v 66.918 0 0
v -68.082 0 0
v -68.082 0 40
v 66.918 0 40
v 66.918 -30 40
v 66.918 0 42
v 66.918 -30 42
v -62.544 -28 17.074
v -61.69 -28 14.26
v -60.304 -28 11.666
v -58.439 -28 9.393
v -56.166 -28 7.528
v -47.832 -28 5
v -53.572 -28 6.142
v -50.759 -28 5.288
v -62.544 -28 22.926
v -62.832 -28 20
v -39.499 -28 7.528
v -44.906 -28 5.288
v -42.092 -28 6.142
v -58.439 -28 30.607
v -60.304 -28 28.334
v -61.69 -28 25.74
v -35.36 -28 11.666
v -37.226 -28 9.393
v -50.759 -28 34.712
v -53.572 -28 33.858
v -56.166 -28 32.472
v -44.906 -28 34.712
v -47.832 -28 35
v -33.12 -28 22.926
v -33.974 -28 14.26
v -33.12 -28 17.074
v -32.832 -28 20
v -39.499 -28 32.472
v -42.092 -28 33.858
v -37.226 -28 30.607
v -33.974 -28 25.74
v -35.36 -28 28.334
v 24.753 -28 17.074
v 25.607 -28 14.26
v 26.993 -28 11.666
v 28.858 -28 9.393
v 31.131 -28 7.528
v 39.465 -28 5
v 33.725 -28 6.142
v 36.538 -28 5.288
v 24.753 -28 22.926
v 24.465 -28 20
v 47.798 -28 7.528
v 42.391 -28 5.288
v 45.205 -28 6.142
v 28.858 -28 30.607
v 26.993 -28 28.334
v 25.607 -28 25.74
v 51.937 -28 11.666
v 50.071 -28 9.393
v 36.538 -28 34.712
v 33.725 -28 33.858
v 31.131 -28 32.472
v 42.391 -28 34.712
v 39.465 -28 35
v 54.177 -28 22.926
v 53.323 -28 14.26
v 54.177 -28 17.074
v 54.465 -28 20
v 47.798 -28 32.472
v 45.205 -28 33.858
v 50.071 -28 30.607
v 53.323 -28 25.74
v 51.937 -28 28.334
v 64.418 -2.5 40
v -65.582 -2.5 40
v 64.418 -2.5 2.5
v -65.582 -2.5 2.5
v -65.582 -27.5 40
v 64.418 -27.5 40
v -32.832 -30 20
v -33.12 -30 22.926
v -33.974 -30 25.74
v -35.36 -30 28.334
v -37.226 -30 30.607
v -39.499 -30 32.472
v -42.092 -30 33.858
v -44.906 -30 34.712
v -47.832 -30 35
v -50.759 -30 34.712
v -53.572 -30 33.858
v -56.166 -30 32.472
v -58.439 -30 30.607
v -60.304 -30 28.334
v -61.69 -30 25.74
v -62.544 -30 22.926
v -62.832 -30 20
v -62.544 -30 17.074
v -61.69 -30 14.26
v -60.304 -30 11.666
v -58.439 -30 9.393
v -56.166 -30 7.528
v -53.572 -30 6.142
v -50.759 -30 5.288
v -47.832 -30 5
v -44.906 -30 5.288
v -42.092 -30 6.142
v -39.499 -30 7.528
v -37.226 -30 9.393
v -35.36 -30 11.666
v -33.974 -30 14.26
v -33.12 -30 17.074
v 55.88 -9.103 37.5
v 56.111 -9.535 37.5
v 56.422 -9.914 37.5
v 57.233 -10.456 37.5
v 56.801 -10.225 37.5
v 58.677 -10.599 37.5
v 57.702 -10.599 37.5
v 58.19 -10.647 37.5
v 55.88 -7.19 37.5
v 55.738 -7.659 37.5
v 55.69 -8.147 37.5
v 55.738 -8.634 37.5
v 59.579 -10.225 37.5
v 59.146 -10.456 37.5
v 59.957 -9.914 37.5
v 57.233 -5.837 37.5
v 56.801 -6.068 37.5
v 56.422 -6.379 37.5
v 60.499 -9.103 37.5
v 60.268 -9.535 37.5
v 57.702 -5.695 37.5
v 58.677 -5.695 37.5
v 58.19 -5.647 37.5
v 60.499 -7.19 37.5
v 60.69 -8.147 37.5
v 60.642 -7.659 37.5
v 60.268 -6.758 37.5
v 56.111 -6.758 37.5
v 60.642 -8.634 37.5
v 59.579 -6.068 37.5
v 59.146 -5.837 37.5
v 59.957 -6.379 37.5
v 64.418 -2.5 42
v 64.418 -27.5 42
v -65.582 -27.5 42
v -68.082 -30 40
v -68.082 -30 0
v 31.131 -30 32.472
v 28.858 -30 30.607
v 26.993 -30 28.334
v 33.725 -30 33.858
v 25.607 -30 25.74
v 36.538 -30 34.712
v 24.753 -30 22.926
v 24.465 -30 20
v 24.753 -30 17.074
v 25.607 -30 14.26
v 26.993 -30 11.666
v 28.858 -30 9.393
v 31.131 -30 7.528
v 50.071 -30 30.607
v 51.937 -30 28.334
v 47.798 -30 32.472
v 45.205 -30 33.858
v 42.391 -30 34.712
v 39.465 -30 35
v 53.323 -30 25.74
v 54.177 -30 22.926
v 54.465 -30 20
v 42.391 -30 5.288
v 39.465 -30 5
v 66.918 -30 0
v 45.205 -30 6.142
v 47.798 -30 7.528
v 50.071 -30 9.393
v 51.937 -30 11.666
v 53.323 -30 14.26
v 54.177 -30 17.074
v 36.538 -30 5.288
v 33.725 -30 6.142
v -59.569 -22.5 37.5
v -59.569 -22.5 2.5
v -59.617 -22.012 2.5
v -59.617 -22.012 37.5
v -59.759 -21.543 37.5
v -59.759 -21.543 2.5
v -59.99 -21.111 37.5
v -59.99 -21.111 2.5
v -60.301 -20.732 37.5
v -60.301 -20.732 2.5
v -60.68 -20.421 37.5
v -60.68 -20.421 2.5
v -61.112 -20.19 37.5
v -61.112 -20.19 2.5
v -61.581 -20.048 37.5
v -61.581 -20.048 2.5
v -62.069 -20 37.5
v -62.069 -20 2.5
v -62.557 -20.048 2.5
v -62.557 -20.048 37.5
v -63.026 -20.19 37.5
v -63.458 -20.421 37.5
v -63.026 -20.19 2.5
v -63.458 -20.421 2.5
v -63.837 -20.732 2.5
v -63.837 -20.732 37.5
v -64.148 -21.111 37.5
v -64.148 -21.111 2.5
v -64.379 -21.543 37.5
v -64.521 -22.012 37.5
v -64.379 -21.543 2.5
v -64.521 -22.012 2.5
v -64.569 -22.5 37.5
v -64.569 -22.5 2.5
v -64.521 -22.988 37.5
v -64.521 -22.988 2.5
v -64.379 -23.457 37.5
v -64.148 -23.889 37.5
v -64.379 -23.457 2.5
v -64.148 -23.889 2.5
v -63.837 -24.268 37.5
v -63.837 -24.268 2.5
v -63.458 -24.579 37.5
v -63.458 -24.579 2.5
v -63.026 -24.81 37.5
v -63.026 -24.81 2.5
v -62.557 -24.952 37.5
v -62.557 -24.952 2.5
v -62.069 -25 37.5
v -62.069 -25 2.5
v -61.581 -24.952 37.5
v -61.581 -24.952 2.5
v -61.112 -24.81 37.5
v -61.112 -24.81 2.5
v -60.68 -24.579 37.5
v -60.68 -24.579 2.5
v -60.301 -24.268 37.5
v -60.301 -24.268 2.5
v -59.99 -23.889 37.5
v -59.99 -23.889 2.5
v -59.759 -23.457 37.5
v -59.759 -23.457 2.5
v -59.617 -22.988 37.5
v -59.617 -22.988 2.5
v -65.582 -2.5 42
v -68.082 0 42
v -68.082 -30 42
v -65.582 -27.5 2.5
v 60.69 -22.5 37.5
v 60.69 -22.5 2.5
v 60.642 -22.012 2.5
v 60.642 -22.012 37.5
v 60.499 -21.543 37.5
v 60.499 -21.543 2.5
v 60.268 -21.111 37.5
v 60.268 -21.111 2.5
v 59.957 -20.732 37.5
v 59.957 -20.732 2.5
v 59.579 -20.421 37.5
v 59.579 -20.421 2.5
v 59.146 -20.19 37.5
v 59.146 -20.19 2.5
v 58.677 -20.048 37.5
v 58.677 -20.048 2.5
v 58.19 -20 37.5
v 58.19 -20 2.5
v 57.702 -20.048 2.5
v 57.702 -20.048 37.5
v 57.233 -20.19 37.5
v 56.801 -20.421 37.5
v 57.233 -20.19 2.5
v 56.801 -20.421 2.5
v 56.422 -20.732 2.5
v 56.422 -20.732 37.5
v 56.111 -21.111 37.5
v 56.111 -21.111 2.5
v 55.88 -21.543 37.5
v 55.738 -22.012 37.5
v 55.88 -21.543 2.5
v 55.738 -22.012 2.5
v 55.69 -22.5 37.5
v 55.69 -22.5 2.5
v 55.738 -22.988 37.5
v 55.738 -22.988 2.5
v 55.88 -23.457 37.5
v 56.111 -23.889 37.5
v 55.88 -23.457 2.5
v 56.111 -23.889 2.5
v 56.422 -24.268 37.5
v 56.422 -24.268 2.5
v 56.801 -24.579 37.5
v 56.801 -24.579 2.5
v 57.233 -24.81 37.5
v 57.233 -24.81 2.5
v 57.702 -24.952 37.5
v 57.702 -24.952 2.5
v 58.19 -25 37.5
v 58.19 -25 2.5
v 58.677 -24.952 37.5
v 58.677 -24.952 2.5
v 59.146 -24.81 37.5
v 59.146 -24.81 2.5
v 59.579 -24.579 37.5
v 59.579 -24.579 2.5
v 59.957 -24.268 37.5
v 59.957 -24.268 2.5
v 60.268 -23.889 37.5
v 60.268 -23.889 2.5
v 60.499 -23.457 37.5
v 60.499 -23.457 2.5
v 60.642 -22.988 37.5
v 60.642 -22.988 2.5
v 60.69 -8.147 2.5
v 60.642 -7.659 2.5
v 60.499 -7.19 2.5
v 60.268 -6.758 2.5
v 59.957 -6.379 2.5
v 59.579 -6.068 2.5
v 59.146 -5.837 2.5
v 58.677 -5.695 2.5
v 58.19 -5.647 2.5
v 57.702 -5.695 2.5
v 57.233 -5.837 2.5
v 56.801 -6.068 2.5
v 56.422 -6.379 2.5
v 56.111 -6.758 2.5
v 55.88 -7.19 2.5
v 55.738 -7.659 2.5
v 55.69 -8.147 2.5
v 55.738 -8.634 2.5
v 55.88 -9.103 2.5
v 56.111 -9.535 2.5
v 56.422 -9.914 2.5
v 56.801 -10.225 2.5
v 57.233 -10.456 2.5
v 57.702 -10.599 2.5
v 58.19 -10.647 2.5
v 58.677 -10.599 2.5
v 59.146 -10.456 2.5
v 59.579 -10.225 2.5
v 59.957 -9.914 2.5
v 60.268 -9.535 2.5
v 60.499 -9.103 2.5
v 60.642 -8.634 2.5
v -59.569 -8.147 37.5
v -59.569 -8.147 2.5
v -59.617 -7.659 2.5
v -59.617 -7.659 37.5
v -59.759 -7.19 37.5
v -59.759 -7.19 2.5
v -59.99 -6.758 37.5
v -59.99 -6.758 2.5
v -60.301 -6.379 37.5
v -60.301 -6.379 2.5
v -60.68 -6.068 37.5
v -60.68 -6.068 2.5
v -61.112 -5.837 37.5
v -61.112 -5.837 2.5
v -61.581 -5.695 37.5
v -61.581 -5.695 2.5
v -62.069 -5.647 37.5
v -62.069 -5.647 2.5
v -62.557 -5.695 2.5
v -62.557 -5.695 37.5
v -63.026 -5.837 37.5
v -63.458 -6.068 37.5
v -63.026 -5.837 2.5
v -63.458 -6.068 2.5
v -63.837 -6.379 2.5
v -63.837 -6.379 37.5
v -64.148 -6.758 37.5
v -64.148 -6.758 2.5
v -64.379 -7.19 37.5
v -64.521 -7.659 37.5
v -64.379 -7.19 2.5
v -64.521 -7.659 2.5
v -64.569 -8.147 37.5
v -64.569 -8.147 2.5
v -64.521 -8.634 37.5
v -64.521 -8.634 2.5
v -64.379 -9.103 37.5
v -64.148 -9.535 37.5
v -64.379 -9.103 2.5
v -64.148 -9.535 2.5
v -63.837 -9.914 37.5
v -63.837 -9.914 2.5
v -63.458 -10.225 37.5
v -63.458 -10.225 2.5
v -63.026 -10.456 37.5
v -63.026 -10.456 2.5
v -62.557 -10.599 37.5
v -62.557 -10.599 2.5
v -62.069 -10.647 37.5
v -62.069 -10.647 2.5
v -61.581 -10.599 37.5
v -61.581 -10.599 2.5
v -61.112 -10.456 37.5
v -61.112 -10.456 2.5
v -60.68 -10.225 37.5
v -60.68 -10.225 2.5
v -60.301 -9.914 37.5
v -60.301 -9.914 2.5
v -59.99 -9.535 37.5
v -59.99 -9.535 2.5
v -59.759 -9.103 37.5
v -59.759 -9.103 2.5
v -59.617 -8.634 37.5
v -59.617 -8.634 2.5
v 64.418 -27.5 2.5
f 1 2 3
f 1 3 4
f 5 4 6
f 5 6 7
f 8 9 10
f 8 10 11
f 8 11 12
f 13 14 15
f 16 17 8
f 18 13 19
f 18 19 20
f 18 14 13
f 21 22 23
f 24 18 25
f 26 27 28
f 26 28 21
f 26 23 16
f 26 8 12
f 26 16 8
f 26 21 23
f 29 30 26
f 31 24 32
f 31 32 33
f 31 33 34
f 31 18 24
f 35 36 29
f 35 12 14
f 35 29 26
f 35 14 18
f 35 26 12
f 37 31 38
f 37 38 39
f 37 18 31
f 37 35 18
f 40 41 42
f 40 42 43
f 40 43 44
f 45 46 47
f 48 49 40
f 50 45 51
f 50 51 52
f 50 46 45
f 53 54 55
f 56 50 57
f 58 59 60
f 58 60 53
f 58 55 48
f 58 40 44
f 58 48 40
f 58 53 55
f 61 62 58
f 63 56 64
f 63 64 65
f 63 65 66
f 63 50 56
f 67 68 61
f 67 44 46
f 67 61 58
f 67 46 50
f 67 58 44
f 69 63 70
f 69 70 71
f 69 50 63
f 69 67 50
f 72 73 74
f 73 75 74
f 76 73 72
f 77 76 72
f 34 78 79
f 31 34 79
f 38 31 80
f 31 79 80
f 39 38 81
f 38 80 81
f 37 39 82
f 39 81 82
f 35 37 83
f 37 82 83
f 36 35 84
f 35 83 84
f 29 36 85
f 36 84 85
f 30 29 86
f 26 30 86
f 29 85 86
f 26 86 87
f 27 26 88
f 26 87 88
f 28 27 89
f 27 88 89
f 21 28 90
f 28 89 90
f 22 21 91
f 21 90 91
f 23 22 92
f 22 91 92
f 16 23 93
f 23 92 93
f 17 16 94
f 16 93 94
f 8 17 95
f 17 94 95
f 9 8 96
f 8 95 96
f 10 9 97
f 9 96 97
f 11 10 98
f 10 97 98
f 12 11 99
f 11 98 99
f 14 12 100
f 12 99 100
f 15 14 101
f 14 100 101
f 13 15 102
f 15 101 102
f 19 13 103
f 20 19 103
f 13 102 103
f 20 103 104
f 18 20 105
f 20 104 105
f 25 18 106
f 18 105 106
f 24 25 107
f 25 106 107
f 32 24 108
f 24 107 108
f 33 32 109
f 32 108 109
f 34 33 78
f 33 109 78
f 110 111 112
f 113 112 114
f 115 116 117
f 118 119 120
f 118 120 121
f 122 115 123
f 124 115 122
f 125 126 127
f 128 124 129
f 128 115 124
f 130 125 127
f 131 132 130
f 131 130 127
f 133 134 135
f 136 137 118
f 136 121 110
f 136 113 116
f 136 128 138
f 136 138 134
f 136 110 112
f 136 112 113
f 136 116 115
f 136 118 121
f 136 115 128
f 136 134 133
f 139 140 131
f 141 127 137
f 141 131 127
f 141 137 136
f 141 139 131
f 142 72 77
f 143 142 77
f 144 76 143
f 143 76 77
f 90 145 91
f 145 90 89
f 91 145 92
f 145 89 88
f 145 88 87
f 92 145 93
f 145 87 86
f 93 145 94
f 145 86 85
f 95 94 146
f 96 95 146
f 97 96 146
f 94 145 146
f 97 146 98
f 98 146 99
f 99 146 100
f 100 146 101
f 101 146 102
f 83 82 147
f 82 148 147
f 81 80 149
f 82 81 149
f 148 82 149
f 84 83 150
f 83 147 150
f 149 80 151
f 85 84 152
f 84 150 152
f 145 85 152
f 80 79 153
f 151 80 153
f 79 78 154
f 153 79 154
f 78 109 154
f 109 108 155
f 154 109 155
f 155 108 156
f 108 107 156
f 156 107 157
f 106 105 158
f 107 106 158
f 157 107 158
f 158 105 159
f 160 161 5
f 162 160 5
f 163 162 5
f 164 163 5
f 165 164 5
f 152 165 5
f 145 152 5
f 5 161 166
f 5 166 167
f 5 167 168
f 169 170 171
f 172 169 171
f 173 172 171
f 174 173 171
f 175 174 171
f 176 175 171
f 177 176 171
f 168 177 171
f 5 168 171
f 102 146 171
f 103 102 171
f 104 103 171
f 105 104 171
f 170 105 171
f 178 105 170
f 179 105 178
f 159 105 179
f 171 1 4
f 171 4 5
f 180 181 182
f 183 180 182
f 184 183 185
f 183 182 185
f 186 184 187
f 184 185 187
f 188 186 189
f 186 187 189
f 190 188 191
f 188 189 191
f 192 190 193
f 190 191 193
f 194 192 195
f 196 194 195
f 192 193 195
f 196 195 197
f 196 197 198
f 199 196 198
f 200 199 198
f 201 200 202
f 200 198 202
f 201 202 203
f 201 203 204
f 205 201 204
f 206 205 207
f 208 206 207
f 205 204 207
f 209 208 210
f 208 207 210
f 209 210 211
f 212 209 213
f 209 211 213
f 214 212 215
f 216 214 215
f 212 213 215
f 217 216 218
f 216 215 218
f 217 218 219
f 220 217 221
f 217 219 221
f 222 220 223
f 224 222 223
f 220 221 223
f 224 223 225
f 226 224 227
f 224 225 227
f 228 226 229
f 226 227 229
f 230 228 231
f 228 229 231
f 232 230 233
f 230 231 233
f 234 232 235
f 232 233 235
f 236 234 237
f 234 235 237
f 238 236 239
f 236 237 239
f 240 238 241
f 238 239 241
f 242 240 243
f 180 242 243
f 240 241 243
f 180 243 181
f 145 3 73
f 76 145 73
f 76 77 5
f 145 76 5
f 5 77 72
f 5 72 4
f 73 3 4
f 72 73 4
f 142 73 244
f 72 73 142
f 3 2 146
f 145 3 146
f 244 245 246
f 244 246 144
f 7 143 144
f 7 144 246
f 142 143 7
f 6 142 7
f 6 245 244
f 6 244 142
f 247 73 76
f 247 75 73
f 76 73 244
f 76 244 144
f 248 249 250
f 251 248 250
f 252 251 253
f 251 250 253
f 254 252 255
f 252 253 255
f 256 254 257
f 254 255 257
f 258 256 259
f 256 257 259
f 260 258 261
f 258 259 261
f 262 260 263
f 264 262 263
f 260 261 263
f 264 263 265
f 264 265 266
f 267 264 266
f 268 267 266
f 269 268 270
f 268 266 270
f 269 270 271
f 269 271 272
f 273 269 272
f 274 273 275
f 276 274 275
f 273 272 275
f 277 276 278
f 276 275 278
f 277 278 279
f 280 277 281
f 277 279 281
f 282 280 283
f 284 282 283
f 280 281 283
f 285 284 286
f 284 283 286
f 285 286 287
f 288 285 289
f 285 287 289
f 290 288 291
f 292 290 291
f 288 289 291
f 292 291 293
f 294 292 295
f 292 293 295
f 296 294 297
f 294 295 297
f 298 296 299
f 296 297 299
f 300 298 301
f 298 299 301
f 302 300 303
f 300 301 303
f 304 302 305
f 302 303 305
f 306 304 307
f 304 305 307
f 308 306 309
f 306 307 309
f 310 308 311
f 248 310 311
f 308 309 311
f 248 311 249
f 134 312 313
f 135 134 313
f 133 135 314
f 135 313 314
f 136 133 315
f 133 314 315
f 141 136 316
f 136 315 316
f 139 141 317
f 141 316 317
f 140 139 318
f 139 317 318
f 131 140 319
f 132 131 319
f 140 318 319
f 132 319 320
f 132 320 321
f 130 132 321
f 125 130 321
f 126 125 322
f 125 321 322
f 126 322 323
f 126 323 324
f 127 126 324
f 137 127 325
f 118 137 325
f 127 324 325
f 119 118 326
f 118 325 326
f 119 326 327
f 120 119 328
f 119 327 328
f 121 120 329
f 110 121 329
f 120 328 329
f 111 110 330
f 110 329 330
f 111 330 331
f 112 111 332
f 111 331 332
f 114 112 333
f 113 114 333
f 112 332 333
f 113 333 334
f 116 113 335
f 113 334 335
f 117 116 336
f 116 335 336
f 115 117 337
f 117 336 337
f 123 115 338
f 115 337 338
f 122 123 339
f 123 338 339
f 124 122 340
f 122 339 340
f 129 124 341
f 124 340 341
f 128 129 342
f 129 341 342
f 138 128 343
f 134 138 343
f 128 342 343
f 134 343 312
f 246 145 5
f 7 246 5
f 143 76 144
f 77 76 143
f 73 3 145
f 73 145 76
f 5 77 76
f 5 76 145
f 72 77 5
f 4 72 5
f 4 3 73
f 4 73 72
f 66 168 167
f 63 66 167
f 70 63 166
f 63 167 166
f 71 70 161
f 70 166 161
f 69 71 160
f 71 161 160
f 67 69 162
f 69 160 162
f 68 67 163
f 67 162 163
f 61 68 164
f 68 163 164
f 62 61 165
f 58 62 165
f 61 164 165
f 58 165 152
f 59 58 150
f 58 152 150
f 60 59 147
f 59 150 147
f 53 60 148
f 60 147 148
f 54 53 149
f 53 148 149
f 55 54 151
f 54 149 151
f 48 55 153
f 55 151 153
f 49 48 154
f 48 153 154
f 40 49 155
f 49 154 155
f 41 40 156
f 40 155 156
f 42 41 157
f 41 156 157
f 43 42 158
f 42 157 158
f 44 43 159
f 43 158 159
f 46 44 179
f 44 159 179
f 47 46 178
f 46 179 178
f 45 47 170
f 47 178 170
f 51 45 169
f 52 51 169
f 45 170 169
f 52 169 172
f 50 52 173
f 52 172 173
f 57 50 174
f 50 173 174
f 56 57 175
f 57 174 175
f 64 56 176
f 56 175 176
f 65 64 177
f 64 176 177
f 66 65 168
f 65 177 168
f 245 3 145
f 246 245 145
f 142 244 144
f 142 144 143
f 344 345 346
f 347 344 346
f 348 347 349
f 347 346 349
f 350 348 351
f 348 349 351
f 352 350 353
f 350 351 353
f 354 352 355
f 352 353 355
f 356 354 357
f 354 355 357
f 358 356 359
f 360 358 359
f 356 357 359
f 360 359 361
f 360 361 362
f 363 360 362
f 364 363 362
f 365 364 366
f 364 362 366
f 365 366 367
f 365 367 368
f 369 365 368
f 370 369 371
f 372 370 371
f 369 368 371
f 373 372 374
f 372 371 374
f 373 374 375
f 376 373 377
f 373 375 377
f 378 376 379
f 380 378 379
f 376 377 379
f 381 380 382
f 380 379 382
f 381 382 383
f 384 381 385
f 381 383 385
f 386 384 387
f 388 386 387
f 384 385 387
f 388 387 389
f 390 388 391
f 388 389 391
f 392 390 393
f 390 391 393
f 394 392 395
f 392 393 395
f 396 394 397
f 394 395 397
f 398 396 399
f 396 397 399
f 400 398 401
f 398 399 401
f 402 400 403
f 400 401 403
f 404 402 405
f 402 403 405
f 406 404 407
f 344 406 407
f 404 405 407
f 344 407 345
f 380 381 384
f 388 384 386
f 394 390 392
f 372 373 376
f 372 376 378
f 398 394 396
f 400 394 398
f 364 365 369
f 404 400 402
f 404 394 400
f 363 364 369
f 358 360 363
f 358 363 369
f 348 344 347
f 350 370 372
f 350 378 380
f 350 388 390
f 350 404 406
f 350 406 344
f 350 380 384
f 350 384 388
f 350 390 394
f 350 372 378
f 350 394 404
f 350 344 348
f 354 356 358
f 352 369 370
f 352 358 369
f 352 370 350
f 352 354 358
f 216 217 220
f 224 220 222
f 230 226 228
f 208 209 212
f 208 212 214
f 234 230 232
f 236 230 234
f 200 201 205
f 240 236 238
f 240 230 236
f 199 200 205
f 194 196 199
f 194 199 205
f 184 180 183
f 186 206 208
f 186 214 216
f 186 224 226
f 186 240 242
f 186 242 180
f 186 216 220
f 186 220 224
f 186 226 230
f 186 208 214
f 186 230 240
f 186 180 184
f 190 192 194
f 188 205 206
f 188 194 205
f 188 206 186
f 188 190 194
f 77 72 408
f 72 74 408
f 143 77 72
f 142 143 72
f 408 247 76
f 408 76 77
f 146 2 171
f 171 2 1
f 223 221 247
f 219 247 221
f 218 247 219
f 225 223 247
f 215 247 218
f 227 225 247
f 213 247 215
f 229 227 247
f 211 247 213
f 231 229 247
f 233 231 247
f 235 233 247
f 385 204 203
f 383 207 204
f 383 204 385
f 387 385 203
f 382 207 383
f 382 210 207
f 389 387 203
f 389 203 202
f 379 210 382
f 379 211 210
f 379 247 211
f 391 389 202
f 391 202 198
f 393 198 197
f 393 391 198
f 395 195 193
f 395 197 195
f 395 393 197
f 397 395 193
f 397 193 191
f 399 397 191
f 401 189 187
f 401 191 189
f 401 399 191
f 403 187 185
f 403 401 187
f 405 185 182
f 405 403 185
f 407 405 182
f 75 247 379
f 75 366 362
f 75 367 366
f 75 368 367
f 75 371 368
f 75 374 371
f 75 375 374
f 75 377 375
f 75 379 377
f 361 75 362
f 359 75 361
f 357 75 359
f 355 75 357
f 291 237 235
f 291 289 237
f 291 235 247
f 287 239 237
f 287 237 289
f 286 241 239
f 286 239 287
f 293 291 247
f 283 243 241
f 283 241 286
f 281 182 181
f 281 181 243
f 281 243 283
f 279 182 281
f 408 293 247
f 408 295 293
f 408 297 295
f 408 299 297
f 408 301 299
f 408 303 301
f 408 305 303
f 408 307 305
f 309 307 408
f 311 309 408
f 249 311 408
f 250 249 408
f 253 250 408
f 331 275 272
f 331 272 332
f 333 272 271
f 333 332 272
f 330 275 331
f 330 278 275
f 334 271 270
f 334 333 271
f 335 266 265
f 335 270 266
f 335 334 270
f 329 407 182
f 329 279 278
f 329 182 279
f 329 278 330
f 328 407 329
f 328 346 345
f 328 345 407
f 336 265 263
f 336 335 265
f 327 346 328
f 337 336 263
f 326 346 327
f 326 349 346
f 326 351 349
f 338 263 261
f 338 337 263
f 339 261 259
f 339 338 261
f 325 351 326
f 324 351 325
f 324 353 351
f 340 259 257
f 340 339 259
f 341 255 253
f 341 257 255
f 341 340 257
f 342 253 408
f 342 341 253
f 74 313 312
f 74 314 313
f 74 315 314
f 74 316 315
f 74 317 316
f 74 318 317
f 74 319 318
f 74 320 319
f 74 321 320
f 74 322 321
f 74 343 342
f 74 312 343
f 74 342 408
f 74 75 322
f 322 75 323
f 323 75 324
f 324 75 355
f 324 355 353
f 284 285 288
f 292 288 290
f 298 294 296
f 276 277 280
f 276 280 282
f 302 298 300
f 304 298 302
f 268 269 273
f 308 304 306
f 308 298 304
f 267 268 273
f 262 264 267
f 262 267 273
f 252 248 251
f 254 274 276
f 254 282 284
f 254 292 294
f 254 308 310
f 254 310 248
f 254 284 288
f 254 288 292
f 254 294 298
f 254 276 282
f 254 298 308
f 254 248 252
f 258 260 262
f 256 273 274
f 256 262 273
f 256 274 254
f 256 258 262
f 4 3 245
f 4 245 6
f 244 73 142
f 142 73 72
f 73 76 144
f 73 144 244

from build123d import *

# Parameters (mm, degrees)
F0_W      = 135
F0_H      = 30
F1_DEPTH  = 30
F2_T      = -2.5
F3_R      = 2.5
F4_DEPTH  = 35
F5_DEPTH  = 5
F6_DEPTH  = 5
F7_W      = 130
F7_H      = 25
F8_DEPTH  = 2
F9_DEPTH  = 2
F10_R     = 15
F11_DEPTH = 2


with BuildPart() as f1:
    # F0 (on Front) → F1 (new body)
    with BuildSketch(Plane.XZ):
        with Locations((-0.5819004774, 15)):
            Rectangle(F0_W, F0_H)
    extrude(amount=F1_DEPTH)

    # F2
    f2_openings = [f1.faces().sort_by_distance(p)[0] for p in [
        (-0.5819, -15, 30),
    ]]
    offset(amount=F2_T, openings=f2_openings)

    # F3 (on face) → F4 (join)
    with BuildSketch(Plane.XY.offset(2.5)):
        with Locations((-62.0689690113, -8.146552369)):
            Circle(F3_R)
        with Locations((-62.0689690113, -22.5000027567)):
            Circle(F3_R)
        with Locations((58.1896565855, -22.5000027567)):
            Circle(F3_R)
        with Locations((58.1896565855, -8.146552369)):
            Circle(F3_R)
    extrude(amount=F4_DEPTH)

    # F5 (add): a face of the model
    f5_faces = [f1.faces().sort_by_distance(p)[0] for p in [
        (65.535167854, -15, 30),
    ]]
    extrude(f5_faces, amount=F5_DEPTH)

    # F6 (add): a face of the model
    f6_faces = [f1.faces().sort_by_distance(p)[0] for p in [
        (65.535167854, -15, 35),
    ]]
    extrude(f6_faces, amount=F6_DEPTH)


with BuildPart() as f8:
    # F7 (on face) → F8 (new body)
    with BuildSketch(Plane.XY.offset(40)):
        with Locations((-0.5819004774, -15)):
            Rectangle(F7_W, F7_H)
    extrude(amount=F8_DEPTH)


with BuildPart() as f9:
    # F9 (new): a face of the model
    f9_faces = [f1.part.faces().sort_by_distance(p)[0] for p in [
        (65.535167854, -15, 40),
    ]]
    extrude(f9_faces, amount=F9_DEPTH)


with BuildPart() as f1_1:
    add(f1.part)

    # F10 (on face) → F11 (cut)
    with BuildSketch(Plane.XZ.offset(30)):
        with Locations((-47.8322058916, 20)):
            Circle(F10_R)
        with Locations((39.4648276269, 20)):
            Circle(F10_R)
    extrude(amount=-F11_DEPTH, mode=Mode.SUBTRACT)


solid = Compound([f8.part, f9.part, f1_1.part])
